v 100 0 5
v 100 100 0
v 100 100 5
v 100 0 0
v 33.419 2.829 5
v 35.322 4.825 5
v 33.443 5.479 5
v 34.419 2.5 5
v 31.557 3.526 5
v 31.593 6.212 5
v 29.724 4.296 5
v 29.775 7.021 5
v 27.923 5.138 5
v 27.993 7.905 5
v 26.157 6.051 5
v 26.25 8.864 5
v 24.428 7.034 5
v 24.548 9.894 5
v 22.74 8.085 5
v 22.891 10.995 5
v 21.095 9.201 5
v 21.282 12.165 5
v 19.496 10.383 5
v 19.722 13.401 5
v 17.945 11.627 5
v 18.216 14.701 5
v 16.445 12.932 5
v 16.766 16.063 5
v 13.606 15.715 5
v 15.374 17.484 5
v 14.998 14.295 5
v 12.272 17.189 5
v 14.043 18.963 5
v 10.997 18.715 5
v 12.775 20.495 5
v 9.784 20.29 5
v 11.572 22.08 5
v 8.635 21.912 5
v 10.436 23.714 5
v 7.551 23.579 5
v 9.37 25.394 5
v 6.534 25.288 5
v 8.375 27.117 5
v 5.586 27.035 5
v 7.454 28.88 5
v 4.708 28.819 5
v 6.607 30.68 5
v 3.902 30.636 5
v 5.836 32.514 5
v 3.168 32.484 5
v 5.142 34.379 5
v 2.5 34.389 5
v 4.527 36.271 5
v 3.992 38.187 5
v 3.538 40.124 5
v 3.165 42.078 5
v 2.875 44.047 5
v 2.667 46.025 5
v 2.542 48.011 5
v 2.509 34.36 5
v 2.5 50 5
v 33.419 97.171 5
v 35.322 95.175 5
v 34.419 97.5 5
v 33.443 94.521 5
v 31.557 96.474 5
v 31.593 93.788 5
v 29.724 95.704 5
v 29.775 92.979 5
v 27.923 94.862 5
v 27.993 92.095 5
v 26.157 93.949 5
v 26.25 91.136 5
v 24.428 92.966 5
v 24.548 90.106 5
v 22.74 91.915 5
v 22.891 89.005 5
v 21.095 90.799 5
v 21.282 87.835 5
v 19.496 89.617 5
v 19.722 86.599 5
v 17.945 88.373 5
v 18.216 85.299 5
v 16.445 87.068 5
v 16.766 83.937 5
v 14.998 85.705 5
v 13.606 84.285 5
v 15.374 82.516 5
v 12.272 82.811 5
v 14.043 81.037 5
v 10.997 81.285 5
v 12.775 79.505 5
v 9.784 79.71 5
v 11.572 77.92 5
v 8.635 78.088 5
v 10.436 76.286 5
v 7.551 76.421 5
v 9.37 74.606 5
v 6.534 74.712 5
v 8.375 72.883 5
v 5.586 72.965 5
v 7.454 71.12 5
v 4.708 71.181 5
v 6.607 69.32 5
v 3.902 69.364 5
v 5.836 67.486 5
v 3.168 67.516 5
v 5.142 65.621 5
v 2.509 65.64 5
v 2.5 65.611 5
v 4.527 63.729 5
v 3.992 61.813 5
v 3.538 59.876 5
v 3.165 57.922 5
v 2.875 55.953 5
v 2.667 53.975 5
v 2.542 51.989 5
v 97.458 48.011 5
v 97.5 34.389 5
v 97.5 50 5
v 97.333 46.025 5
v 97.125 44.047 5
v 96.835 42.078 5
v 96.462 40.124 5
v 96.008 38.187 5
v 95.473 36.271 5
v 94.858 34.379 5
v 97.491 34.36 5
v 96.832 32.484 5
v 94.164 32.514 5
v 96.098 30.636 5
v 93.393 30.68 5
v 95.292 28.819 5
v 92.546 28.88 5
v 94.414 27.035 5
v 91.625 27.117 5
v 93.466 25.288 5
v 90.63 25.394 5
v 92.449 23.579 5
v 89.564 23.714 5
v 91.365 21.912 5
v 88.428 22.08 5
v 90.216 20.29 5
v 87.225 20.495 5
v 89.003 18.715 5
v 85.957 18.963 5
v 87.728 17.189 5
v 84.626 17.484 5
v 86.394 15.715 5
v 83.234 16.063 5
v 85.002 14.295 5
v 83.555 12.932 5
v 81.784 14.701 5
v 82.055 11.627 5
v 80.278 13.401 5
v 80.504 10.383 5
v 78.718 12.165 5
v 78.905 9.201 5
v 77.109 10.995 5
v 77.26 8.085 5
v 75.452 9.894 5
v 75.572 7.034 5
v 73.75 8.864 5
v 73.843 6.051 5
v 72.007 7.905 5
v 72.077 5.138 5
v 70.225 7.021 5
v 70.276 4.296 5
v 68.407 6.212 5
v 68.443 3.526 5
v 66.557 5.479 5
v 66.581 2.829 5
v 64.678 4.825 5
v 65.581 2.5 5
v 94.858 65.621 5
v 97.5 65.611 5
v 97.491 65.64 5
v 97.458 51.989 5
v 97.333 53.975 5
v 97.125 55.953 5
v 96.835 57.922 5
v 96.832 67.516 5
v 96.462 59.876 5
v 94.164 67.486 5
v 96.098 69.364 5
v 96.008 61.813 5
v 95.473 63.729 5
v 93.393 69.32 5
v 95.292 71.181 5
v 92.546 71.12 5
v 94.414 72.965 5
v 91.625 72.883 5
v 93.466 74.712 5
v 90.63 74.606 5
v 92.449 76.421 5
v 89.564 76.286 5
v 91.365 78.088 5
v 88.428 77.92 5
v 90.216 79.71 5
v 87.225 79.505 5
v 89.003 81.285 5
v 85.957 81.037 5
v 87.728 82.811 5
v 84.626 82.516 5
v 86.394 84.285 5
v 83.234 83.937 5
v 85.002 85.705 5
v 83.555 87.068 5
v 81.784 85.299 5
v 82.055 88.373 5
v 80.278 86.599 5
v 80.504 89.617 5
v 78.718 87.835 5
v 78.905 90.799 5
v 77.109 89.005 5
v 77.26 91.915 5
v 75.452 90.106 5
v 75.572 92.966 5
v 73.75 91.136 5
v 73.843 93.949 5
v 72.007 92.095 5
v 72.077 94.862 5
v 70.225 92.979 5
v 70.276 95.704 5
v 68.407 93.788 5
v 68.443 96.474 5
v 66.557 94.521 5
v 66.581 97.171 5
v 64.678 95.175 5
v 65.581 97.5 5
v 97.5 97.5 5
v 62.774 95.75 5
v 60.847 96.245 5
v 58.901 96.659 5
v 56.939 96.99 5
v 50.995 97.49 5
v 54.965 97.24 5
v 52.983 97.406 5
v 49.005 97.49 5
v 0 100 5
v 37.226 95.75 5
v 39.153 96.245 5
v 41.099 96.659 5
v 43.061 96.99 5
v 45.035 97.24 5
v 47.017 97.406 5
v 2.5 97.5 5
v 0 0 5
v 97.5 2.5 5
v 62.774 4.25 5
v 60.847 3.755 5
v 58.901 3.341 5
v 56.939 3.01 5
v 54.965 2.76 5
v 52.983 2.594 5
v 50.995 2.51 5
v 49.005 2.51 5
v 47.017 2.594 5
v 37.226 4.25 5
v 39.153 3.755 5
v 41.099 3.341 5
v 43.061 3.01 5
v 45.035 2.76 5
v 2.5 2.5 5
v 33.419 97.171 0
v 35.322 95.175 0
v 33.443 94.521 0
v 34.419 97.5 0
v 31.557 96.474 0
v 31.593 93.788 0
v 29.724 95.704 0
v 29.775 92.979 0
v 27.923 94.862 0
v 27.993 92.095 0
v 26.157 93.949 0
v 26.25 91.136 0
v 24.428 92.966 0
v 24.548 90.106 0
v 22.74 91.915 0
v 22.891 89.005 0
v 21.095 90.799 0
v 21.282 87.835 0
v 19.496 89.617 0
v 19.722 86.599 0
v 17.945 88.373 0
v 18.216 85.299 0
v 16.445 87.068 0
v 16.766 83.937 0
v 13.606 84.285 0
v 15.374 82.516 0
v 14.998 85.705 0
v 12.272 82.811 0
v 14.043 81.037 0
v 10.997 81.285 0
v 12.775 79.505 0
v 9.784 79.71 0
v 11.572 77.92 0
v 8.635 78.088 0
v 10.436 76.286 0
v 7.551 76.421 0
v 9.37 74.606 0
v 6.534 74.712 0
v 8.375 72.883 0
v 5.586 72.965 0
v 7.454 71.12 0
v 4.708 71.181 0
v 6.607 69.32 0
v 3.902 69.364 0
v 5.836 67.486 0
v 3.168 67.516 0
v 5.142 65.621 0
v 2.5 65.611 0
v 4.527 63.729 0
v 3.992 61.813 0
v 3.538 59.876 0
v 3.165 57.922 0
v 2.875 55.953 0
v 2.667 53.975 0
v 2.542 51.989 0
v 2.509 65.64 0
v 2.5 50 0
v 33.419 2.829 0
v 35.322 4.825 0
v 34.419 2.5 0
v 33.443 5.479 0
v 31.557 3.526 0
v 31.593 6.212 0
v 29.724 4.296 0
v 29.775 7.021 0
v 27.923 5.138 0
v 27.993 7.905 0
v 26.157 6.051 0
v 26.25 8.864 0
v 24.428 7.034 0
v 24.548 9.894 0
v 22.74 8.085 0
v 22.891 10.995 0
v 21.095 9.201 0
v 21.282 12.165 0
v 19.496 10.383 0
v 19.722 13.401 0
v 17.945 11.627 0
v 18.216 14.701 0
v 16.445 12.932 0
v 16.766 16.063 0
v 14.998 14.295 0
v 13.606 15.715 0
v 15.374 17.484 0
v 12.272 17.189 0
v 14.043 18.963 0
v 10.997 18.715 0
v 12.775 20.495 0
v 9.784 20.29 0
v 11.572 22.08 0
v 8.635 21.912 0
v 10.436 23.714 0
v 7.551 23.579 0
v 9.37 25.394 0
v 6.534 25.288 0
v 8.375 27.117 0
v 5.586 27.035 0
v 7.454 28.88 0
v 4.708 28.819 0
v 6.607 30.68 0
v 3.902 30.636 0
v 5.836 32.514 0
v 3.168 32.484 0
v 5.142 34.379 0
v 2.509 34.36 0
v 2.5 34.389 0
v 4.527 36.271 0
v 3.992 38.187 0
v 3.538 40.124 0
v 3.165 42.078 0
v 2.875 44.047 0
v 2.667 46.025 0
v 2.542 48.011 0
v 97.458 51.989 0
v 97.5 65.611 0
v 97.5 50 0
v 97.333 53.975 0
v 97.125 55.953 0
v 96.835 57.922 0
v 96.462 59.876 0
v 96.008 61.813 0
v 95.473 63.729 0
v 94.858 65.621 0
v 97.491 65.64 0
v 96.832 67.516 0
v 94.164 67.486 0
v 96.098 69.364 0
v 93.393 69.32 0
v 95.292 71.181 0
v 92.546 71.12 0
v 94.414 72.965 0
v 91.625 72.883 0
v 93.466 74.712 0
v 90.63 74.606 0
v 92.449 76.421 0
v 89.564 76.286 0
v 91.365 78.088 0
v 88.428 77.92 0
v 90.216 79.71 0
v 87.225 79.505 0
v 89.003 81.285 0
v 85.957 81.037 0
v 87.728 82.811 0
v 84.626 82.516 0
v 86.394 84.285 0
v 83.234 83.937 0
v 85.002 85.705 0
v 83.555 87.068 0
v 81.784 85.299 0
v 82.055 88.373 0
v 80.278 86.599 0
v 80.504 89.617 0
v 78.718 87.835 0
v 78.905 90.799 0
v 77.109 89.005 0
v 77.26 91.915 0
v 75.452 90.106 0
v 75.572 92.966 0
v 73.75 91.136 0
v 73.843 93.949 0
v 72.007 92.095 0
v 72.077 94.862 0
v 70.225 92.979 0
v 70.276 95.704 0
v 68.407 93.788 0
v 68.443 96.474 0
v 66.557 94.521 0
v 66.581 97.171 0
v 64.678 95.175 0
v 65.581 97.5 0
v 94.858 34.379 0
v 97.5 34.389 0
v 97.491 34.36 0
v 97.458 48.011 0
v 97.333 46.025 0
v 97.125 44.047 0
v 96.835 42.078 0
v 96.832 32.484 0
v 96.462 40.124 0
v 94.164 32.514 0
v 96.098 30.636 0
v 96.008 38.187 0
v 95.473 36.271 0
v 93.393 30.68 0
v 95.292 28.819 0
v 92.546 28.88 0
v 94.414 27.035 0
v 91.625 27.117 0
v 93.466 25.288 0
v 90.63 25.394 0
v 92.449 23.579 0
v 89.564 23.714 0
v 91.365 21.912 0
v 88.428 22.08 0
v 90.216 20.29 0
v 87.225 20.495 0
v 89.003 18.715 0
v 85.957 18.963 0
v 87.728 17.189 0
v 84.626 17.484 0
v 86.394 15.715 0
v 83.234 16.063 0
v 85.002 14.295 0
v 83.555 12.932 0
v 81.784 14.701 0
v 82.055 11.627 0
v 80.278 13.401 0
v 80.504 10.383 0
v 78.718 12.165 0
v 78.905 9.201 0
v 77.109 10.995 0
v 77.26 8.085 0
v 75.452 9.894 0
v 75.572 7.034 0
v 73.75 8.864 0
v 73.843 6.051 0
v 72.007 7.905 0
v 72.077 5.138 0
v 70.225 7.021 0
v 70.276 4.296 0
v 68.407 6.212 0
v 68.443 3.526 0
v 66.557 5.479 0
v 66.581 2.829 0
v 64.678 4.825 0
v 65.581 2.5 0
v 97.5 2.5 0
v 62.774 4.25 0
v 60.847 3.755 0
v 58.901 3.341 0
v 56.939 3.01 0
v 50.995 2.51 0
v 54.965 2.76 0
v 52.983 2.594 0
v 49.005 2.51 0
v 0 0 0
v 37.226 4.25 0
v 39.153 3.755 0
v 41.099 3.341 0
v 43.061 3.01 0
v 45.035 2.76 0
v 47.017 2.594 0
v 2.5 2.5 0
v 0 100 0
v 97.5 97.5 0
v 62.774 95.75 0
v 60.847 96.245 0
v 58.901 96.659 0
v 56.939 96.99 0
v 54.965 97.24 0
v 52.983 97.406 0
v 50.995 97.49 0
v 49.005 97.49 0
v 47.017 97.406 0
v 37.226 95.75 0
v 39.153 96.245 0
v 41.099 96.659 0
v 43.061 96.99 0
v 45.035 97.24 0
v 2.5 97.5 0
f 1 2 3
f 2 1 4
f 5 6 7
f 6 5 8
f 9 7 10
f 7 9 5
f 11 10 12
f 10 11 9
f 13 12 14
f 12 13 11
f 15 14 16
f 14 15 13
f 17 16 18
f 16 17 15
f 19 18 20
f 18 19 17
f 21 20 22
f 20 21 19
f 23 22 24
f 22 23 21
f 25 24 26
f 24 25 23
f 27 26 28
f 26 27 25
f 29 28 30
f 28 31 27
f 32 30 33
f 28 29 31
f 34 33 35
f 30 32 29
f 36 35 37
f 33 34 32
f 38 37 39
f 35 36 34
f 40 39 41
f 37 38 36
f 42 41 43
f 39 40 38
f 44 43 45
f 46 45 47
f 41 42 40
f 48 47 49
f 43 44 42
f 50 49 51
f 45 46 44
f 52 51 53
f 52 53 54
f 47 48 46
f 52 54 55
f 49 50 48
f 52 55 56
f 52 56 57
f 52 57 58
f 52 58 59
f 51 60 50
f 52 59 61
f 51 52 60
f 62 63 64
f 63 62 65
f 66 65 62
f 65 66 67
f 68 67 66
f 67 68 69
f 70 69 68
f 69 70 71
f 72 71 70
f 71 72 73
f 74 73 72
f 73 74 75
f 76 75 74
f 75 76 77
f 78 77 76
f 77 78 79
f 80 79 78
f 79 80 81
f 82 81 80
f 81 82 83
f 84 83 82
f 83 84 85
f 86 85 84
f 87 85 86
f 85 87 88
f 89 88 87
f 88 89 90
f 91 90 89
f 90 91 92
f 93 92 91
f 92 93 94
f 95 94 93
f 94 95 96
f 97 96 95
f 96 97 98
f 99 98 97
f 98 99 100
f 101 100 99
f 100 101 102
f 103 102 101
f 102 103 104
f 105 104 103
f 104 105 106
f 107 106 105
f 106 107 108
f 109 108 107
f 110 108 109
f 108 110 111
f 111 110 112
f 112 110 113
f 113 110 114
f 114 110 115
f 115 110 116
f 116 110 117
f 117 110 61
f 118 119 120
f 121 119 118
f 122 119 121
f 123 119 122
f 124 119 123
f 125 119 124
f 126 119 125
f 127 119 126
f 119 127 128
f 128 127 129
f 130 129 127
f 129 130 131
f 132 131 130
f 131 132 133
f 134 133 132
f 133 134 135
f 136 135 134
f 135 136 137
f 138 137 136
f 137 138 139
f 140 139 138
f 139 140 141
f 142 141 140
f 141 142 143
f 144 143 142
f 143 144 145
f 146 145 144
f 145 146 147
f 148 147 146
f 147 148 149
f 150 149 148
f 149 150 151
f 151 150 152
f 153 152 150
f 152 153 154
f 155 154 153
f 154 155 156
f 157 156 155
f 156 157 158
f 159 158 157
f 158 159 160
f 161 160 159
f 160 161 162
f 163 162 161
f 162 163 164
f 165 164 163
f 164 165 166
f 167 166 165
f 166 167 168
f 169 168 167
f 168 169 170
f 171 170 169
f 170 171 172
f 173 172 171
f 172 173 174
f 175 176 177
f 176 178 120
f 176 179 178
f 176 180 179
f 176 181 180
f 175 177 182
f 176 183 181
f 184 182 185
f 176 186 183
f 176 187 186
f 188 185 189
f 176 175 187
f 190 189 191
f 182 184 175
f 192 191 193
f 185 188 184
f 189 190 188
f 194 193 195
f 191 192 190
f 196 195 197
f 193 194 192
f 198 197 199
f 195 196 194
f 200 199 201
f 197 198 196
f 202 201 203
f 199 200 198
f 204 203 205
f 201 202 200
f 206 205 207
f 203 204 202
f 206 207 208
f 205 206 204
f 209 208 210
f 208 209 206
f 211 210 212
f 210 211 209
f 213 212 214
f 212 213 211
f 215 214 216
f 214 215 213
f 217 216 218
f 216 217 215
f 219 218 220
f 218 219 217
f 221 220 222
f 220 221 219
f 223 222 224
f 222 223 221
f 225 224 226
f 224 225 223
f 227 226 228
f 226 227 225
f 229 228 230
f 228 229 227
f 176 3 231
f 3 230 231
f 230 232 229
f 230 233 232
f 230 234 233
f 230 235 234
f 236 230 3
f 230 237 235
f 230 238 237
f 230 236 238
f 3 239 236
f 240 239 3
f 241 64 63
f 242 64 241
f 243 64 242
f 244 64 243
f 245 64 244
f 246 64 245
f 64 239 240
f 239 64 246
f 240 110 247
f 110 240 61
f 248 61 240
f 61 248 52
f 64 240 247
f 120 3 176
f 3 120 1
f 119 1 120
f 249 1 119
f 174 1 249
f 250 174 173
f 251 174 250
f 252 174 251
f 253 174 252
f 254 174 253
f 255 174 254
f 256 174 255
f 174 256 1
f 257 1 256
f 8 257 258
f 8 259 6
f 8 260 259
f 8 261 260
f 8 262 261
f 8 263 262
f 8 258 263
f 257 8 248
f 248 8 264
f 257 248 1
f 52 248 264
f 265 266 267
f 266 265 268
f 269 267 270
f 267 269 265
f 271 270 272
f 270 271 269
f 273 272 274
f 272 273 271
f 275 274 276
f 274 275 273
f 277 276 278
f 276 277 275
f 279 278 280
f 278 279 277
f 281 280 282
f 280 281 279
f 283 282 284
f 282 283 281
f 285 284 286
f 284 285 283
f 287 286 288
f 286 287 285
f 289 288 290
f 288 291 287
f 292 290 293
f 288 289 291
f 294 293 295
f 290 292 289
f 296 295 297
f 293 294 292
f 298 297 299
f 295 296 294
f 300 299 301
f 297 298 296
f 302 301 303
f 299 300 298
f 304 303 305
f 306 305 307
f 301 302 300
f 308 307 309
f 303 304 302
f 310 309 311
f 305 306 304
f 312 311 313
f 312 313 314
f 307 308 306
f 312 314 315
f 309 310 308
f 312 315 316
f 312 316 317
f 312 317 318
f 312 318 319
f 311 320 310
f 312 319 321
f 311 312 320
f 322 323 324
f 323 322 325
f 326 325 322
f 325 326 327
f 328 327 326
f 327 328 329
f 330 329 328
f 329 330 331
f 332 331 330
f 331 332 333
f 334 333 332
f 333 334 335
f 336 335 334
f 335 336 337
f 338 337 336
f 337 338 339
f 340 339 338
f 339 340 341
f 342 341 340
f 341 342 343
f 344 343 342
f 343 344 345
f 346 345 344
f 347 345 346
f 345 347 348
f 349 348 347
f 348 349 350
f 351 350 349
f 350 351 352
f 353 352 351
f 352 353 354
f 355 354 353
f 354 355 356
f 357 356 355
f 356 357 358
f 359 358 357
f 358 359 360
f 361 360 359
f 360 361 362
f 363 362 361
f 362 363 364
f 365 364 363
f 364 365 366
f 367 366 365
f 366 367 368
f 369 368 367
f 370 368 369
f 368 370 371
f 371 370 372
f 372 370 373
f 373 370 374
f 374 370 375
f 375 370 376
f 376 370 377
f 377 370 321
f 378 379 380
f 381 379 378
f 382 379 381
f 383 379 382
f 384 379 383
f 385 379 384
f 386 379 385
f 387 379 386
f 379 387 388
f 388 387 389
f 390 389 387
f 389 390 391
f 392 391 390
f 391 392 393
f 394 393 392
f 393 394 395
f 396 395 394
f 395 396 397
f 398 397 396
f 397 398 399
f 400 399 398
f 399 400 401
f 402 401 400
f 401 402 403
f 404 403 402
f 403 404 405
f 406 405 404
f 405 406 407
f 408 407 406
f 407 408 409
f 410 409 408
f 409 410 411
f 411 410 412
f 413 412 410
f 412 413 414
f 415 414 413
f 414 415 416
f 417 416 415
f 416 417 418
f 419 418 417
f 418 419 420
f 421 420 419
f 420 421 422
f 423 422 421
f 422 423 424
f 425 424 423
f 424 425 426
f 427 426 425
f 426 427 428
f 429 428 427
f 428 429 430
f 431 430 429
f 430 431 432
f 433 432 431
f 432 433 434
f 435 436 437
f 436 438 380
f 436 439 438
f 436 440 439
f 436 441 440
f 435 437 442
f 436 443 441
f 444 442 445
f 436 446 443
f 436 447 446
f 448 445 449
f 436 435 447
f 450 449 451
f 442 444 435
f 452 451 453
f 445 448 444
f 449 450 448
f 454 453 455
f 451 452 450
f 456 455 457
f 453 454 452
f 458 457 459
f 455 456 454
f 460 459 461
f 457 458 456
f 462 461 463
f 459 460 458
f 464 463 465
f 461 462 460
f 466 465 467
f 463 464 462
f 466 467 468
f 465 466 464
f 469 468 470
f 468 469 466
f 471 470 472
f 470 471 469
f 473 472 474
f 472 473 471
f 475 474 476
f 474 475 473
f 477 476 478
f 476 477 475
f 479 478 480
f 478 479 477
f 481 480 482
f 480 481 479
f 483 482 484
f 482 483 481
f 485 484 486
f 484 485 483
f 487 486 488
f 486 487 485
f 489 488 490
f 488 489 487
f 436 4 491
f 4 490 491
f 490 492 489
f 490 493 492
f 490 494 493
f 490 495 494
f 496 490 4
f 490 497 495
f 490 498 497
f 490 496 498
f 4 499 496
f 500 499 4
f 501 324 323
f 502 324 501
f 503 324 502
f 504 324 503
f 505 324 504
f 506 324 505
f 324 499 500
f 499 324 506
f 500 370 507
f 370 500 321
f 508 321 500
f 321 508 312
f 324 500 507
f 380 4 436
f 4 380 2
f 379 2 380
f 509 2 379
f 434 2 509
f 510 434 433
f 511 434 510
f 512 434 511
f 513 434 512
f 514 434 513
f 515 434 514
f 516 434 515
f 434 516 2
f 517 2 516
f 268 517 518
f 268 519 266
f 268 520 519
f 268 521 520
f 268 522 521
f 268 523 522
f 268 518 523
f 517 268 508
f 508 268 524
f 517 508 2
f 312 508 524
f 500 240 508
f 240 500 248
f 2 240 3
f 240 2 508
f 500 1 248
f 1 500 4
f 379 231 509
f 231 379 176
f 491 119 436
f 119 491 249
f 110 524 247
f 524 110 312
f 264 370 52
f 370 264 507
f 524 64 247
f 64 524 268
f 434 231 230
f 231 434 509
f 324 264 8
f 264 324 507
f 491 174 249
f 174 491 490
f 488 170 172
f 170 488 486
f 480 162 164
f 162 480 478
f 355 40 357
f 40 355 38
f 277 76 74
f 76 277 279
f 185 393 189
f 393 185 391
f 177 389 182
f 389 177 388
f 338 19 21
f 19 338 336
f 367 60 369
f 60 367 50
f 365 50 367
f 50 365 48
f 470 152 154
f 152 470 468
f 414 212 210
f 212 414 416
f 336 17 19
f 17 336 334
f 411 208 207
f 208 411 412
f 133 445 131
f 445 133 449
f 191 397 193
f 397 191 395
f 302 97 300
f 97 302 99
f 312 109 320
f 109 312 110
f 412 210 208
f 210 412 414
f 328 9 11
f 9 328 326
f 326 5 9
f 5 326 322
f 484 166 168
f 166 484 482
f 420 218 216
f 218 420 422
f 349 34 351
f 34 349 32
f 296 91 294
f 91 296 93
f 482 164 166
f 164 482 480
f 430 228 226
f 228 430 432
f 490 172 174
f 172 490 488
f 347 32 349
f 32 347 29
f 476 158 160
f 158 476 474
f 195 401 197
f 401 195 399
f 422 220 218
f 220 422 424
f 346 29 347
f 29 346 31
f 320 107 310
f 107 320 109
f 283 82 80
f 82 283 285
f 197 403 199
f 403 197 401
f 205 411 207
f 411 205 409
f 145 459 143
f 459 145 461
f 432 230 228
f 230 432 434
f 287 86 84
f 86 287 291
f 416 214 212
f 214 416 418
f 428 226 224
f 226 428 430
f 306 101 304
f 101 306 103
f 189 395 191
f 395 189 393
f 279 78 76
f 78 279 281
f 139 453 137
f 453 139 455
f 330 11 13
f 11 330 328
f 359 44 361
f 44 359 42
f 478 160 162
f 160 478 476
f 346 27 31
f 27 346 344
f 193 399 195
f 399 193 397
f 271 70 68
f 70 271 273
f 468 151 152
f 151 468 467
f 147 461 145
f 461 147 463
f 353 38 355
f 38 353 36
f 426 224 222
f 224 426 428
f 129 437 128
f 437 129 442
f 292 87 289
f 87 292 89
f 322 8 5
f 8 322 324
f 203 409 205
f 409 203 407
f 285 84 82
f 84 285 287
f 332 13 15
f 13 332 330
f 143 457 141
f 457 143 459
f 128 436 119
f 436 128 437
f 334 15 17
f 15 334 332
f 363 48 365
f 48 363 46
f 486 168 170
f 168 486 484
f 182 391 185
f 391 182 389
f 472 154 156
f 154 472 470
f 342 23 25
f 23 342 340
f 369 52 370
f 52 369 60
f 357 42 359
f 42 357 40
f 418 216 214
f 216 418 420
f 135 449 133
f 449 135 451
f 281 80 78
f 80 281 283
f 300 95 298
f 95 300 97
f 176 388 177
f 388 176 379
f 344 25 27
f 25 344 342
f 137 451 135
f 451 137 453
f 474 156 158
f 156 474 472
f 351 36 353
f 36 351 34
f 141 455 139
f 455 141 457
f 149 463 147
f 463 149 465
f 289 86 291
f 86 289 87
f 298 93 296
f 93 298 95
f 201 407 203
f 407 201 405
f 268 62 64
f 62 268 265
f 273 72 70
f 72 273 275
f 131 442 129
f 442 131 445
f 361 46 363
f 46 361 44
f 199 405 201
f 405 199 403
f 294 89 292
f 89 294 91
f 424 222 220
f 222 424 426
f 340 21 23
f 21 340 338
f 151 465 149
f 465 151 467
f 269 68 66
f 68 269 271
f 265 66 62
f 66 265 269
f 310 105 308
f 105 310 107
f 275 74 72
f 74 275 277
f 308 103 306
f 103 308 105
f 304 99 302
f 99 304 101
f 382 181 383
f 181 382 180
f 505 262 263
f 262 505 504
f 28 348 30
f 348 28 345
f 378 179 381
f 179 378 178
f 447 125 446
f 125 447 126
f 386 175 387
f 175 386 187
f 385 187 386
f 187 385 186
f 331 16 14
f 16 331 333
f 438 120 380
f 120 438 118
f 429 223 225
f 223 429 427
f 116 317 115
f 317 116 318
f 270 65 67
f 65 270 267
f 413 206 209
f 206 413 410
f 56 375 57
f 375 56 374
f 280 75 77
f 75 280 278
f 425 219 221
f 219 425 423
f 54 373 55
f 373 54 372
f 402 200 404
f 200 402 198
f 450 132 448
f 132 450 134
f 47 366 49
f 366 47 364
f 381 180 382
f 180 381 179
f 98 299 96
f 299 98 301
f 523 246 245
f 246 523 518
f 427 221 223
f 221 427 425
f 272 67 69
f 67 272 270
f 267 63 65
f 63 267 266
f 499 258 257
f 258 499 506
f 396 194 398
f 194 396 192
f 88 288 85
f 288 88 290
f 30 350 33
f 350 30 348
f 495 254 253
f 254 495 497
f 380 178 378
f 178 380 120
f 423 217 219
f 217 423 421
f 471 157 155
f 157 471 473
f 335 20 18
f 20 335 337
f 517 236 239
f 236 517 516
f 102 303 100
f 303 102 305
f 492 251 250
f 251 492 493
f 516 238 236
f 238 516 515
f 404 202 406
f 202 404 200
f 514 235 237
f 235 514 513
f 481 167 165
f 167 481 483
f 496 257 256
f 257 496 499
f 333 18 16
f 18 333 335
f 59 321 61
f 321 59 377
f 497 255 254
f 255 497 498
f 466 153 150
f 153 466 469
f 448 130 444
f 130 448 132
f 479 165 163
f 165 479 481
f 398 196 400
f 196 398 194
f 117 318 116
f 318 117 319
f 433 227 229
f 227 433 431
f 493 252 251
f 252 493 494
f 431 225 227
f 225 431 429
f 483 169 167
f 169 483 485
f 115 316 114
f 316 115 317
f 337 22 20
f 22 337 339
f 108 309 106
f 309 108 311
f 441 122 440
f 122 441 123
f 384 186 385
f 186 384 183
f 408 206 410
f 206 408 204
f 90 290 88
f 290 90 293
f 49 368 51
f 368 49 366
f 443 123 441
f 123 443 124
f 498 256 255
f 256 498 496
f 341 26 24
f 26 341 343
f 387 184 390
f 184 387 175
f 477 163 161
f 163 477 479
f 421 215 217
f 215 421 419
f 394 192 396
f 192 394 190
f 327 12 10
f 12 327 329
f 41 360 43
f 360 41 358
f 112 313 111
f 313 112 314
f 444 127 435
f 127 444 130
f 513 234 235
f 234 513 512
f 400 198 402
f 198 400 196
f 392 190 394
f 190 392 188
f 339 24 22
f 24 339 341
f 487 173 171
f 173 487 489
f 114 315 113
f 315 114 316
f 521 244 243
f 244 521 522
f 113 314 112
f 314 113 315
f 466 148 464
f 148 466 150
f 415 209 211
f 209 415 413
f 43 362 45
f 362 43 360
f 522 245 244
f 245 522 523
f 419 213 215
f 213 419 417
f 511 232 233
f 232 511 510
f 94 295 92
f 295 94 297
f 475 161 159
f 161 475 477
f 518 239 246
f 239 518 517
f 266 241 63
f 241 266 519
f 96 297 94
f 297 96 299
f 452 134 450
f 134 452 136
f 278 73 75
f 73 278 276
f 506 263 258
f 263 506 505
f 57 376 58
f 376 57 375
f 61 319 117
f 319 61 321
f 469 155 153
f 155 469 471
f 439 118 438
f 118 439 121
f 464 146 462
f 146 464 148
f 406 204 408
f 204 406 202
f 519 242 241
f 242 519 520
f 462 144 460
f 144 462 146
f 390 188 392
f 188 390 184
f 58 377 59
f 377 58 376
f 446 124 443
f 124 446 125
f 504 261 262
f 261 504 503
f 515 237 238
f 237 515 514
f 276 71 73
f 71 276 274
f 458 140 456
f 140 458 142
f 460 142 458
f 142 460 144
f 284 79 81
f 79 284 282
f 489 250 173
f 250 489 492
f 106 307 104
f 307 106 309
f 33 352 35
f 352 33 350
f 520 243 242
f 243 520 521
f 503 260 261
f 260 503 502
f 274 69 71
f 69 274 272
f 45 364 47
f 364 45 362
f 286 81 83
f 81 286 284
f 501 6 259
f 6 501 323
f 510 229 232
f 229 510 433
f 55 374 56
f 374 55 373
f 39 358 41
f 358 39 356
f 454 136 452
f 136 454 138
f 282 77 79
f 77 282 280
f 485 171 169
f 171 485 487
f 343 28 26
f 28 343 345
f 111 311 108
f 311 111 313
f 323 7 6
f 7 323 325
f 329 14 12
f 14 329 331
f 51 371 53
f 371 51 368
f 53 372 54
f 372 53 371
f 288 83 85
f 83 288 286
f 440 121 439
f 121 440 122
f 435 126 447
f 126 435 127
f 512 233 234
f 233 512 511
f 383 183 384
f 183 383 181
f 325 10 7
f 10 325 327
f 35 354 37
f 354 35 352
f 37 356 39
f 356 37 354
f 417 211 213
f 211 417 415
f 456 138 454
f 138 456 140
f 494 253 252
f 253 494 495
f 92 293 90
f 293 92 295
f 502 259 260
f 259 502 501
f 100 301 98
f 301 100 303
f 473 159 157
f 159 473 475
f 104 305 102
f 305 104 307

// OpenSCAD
$fa = 0.01;
size = 100;
height= 5;
thick = 5;
union() {
difference() 
{
    cube([size,size,height]);    
    translate([thick / 2.0,thick/2.0,-10])cube([size-thick,size-thick,height+50]);        
}
difference() {
translate([size/2.0,size/2.0,0])cylinder(height,size/2.0,size/2.0);
translate([size/2.0,size/2.0,-10])cylinder(height+20,size/2.0 - thick/2.0,size/2.0 - thick/2.0);
}
};
